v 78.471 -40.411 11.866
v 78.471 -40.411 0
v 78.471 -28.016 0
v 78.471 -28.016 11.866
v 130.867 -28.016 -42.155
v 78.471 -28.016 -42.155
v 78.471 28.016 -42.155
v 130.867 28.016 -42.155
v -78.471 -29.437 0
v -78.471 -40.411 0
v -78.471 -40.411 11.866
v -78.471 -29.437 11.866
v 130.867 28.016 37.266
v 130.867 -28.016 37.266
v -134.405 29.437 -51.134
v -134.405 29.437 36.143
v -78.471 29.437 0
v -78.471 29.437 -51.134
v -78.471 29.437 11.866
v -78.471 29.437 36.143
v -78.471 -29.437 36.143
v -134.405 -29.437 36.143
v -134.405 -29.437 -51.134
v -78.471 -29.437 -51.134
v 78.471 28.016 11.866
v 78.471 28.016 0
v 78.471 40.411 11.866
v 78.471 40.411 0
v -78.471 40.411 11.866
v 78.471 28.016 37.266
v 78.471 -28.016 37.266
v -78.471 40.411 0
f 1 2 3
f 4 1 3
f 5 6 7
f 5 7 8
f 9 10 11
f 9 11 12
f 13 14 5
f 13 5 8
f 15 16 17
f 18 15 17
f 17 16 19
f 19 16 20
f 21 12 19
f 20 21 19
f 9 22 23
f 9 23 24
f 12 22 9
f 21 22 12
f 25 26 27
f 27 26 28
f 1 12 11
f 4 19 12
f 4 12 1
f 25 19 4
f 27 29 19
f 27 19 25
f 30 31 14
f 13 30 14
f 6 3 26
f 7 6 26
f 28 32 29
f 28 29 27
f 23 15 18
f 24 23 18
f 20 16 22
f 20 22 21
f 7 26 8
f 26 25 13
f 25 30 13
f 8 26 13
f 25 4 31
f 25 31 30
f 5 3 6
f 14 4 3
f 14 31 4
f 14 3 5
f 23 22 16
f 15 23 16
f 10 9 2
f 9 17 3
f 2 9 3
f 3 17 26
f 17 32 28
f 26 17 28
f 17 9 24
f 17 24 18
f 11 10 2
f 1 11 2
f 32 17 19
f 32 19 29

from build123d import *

# Parameters (mm, degrees)
F0_W          = 156.942024
F0_H          = 80.822982
F1_DEPTH      = 11.86577
F2_W          = 55.933565
F2_H          = 58.87492
F4_DEPTH      = 24.27763
F4_DEPTH_BACK = 62.99935
F3_W          = 52.396328
F3_H          = 56.031708
F5_DEPTH      = 25.4
F5_DEPTH_BACK = 54.0204


with BuildPart() as f1:
    # F0 (on Top) → F1 (new body)
    with BuildSketch(Plane.XY):
        Rectangle(F0_W, F0_H)
    extrude(amount=F1_DEPTH)

    # F2 (on face) → F4 (join, two sides)
    with BuildSketch(Plane.XY.offset(11.86577)) as f4_sk:
        with Locations((-106.437794, 0)):
            Rectangle(F2_W, F2_H)
    extrude(amount=F4_DEPTH)
    extrude(f4_sk.sketch, amount=-F4_DEPTH_BACK)

    # F3 (on face) → F5 (join, two sides)
    with BuildSketch(Plane.XY.offset(11.86577)) as f5_sk:
        with Locations((104.669176, 0)):
            Rectangle(F3_W, F3_H)
    extrude(amount=F5_DEPTH)
    extrude(f5_sk.sketch, amount=-F5_DEPTH_BACK)


solid = f1.part
